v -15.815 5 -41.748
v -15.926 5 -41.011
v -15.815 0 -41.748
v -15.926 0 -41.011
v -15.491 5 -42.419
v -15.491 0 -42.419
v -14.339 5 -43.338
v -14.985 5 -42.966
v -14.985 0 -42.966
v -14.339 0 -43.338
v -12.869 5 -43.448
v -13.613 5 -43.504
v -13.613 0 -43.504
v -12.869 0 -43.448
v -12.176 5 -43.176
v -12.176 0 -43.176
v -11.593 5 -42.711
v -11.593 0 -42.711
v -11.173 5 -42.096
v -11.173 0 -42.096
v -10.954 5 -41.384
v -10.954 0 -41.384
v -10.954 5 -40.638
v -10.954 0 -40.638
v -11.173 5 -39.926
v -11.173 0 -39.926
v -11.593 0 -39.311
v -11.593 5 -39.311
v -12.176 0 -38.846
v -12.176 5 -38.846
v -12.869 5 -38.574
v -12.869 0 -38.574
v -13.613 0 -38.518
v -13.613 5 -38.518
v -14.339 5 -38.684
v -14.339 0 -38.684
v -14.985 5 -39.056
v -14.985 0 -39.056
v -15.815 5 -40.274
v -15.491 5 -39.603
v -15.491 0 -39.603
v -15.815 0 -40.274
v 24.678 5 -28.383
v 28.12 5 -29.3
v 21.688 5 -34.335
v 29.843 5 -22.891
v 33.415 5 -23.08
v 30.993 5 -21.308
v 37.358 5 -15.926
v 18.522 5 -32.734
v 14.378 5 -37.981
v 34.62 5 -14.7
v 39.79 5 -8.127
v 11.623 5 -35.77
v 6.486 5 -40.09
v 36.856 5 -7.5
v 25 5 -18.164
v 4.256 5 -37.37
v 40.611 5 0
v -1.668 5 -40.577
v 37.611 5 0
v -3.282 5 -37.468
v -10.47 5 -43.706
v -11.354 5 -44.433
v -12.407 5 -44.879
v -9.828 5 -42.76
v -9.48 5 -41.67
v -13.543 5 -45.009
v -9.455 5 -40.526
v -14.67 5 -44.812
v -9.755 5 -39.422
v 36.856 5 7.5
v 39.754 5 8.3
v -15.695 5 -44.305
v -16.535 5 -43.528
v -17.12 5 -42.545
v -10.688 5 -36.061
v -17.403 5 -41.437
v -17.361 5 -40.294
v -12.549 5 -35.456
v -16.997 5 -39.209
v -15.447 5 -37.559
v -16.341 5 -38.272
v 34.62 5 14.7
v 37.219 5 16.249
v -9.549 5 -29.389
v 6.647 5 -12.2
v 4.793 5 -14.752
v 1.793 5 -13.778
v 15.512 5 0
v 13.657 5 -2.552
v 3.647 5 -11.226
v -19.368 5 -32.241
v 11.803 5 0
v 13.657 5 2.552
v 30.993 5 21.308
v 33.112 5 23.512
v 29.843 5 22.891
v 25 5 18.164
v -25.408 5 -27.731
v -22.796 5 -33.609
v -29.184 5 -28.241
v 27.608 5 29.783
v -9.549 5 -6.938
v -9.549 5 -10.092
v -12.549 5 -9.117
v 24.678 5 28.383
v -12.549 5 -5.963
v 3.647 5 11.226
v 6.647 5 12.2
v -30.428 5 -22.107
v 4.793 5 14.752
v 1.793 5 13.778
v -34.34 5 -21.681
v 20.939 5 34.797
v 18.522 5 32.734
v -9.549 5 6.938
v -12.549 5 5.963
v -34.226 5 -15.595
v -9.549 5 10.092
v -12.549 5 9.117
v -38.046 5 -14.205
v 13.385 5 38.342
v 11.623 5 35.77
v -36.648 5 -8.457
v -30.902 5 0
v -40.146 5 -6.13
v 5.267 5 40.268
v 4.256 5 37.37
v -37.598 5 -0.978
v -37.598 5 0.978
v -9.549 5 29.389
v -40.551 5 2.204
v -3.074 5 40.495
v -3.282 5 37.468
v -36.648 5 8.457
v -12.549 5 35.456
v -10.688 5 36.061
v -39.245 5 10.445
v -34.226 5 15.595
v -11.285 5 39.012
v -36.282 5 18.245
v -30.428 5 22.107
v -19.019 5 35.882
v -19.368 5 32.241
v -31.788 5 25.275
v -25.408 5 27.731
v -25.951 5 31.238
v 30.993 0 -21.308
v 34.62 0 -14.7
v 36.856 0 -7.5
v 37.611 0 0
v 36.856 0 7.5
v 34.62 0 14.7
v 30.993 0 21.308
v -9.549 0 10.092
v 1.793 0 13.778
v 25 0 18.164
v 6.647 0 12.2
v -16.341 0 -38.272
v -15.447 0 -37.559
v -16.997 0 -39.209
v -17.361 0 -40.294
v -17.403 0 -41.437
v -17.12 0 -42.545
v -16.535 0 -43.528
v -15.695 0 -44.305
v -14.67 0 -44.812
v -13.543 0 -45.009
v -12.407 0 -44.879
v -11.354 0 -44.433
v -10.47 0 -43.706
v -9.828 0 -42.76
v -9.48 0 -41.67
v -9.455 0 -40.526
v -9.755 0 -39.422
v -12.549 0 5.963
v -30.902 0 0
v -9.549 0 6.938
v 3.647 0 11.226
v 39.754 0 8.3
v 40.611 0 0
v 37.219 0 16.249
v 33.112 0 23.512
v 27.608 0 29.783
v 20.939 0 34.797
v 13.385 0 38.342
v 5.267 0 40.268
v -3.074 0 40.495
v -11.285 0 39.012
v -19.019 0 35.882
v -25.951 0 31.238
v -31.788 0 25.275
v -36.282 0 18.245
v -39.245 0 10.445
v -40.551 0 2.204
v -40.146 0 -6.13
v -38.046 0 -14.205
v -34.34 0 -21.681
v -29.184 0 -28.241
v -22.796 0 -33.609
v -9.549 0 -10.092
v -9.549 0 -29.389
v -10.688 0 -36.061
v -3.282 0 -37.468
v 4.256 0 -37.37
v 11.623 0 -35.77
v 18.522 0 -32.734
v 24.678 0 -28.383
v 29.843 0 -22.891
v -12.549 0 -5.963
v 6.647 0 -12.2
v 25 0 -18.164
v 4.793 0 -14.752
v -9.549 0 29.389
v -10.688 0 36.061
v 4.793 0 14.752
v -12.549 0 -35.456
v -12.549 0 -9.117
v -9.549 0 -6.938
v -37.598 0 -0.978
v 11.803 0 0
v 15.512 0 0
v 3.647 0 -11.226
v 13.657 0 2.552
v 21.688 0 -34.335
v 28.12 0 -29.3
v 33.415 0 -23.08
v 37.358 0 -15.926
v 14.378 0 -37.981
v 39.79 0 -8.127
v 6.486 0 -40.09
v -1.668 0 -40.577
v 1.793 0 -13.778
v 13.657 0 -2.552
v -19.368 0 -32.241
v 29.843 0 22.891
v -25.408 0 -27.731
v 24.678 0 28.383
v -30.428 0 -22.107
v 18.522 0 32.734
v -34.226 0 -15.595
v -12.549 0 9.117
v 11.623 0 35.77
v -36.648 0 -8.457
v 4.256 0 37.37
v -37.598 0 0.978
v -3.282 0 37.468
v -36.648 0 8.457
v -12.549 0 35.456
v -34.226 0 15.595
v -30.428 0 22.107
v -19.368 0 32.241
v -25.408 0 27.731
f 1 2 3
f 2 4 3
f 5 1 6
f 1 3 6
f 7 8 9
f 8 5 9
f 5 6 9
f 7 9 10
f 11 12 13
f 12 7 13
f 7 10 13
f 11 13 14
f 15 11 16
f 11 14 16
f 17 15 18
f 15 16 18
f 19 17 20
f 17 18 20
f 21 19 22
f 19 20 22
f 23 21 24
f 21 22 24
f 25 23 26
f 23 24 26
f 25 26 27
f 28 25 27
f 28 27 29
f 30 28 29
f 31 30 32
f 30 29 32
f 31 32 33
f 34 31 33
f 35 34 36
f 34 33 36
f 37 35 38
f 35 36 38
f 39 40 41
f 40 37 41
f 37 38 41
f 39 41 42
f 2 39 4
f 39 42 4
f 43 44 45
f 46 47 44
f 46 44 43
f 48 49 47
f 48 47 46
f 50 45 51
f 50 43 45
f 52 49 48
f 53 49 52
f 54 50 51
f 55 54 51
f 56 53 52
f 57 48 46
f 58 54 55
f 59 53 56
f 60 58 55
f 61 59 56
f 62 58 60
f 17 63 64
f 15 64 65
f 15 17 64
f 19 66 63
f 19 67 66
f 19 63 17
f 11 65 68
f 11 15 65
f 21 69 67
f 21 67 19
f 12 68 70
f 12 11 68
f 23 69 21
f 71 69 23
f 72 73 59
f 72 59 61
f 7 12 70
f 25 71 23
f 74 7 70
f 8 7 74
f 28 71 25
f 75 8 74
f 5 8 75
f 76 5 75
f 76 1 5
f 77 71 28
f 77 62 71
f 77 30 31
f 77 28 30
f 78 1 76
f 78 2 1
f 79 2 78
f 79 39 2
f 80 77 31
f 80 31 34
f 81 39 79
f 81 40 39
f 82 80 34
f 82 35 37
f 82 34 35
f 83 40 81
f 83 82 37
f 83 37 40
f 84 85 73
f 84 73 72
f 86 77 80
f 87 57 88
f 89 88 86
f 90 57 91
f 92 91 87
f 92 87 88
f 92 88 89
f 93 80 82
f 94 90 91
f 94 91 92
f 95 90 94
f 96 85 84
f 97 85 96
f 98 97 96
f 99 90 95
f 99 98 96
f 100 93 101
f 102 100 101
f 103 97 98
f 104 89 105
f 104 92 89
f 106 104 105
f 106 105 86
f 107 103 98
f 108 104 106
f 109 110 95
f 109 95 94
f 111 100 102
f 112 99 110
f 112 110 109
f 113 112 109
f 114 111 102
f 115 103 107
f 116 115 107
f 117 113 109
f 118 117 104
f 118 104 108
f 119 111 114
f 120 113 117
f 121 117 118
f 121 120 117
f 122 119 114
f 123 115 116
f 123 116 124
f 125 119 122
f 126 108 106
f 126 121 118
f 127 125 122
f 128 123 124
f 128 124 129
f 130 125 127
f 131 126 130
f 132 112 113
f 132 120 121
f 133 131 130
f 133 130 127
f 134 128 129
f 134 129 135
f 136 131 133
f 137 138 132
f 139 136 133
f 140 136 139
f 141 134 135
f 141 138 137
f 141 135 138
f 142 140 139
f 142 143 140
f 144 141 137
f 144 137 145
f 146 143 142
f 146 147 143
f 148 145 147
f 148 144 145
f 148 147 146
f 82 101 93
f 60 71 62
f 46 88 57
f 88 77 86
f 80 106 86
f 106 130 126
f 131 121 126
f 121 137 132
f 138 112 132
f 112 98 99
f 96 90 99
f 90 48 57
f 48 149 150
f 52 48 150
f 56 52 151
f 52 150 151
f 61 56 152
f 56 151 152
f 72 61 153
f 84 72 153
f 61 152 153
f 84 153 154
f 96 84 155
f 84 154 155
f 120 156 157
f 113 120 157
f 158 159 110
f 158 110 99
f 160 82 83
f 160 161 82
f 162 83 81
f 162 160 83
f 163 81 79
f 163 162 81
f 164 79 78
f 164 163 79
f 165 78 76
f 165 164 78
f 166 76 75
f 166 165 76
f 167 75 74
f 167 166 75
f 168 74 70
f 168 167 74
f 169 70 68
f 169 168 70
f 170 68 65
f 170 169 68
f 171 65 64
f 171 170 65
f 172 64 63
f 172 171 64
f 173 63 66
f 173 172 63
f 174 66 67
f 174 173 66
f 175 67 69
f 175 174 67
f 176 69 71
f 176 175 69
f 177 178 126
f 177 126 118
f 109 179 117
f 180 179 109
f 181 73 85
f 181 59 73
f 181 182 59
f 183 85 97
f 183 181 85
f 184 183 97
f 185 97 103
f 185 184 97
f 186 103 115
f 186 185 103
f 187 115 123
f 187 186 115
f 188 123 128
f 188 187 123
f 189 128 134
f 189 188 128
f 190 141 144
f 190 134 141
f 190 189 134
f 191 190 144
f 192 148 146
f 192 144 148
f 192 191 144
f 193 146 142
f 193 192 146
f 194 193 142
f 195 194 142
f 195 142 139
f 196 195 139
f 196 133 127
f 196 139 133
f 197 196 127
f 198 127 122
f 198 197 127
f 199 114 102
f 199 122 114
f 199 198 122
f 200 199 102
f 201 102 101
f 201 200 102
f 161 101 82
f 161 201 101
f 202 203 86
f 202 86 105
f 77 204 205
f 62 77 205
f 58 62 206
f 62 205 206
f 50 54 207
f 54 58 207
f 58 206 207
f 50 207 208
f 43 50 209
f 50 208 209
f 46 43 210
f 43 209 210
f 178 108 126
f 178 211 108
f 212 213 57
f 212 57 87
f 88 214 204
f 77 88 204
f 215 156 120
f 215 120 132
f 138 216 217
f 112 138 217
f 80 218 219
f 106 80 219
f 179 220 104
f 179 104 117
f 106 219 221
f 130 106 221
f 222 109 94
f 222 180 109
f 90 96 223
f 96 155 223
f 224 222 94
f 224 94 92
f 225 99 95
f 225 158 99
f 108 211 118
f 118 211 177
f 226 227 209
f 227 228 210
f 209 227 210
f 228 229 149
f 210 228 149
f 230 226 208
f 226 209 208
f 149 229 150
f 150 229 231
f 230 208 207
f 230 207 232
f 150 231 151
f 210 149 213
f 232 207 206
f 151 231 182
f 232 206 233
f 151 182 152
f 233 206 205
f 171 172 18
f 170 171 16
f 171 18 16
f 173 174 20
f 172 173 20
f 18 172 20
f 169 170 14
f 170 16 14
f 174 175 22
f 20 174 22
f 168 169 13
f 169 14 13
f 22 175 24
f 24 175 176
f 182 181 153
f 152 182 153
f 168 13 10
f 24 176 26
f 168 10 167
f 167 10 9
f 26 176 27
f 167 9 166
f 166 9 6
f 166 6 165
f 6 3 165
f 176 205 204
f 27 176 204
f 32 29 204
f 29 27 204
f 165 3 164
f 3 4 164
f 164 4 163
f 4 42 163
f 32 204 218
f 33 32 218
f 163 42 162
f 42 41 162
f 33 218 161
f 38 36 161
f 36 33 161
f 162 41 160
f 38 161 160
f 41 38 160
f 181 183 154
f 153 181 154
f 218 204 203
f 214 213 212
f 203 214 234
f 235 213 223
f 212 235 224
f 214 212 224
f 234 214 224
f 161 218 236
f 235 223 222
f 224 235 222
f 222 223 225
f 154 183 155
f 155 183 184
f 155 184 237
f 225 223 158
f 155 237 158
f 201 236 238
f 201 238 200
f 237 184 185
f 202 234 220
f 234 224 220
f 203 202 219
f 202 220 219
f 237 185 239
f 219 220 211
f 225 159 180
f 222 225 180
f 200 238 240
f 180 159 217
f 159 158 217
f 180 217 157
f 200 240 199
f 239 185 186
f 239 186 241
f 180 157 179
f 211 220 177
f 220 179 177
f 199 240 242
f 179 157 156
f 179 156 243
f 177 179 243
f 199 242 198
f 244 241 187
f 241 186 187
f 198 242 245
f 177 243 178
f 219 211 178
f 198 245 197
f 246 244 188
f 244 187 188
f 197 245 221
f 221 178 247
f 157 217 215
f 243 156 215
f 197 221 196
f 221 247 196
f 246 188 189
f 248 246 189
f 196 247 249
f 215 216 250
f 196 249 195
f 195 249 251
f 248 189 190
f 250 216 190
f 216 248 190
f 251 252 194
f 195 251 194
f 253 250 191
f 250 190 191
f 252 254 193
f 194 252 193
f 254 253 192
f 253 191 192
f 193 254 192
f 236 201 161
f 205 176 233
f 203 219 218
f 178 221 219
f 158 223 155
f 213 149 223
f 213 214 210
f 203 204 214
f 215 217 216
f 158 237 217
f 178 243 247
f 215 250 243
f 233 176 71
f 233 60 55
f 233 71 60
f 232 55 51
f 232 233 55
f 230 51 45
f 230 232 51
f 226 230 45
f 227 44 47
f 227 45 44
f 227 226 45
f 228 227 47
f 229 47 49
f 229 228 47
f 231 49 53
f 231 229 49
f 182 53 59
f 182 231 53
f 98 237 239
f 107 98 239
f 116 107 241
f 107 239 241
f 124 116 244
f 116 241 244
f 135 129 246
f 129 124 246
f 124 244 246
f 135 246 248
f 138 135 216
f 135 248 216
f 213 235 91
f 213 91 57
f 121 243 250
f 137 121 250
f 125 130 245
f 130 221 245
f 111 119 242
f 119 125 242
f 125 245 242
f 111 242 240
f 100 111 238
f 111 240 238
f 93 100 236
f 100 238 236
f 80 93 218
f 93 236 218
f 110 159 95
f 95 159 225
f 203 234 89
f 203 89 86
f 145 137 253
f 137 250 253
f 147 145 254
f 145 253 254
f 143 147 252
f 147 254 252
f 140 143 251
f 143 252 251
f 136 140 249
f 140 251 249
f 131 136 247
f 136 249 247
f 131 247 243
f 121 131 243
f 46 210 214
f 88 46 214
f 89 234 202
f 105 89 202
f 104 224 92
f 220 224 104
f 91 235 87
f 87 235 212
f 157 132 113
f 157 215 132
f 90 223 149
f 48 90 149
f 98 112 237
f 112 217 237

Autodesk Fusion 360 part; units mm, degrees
sketch "草图2" plane through (0, 0, 0) normal (0, 1, 0) x (1, 0, 0)
  line L0 (-9.5492, 29.3893) -> (-9.5492, -29.3893)
  line L1 (-9.5492, -29.3893) -> (25, 18.1636)
  line L2 (25, 18.1636) -> (-30.9017, 0)
  line L3 (-30.9017, 0) -> (25, -18.1636)
  line L4 (25, -18.1636) -> (-9.5492, 29.3893)
  line L5 (-37.5985, -0.9785) -> (29.8427, -22.8914)
  line L6 (30.993, -21.3083) -> (-10.688, 36.0607)
  line L7 (-10.688, -36.0607) -> (30.993, 21.3083)
  line L8 (29.8427, 22.8914) -> (-37.5985, 0.9785)
  line L9 (-12.5492, 35.456) -> (-12.5492, -35.456)
  circle A0 centre (0, 0) radius 40.6112
  circle A1 centre (0, 0) radius 37.6112
  dimension "d2" = 3
extrude "拉伸1" add sketch "草图2" along normal blind 5 contours L0 L4 L6 L8 L9 A1 | L0 L2 L4 L8 | L0 L2 L8 L9 | L2 L4 L6 L8 | L0 L2 L3 L9 | L2 L3 L5 L8 L9 A1 | L1 L2 L4 L6 | L1 L2 L6 L7 L8 A1 | L0 L1 L3 L5 | L0 L3 L5 L9 | L1 L3 L4 L7 | L1 L4 L6 L7 | L0 L1 L5 L7 L9 A1 | L1 L3 L5 L7 | L3 L4 L5 L6 L7 A1 | A0 makes body 1
sketch "草图3" plane through (0, 5, 0) normal (0, 1, 0) x (-1, 0, 0)
  arc A0 (10.688, 36.0607) -> (-29.8427, 22.8914) centre (0, 0) ccw
  line L0 (10.688, 36.0607) -> (-4.7933, 14.7524)
  line L1 (-4.7933, 14.7524) -> (-29.8427, 22.8914)
  line L2 (9.5492, -29.3893) -> (-1.7933, -13.7777)
  line L3 (-1.7933, -13.7777) -> (9.5492, -10.0923)
  line L4 (9.5492, -10.0923) -> (9.5492, -29.3893)
  arc A1 (12.5492, -35.456) -> (37.5985, -0.9785) centre (0, 0) ccw
  line L5 (12.5492, -35.456) -> (12.5492, -9.1175)
  line L6 (12.5492, -9.1175) -> (37.5985, -0.9785)
  line L7 (9.5492, 29.3893) -> (9.5492, 10.0923)
  line L8 (9.5492, 10.0923) -> (-1.7933, 13.7777)
  line L9 (-1.7933, 13.7777) -> (9.5492, 29.3893)
  line L10 (-25, 18.1636) -> (-6.6475, 12.2005)
  line L11 (-6.6475, 12.2005) -> (-13.6575, 2.552)
  line L12 (-13.6575, 2.552) -> (-25, 18.1636)
  line L13 (30.9017, 0) -> (12.5492, -5.9631)
  line L14 (12.5492, -5.9631) -> (12.5492, 5.9631)
  line L15 (12.5492, 5.9631) -> (30.9017, 0)
  arc A2 (37.5985, 0.9785) -> (12.5492, 35.456) centre (0, 0) ccw
  line L16 (37.5985, 0.9785) -> (12.5492, 9.1175)
  line L17 (12.5492, 9.1175) -> (12.5492, 35.456)
  line L18 (-25, -18.1636) -> (-13.6575, -2.552)
  line L19 (-13.6575, -2.552) -> (-6.6475, -12.2005)
  line L20 (-6.6475, -12.2005) -> (-25, -18.1636)
  line L21 (-30.993, 21.3083) -> (-15.5116, 0)
  line L22 (-15.5116, 0) -> (-30.993, -21.3083)
  arc A3 (-30.993, 21.3083) -> (-30.993, -21.3083) centre (0, 0) ccw
  arc A4 (-29.8427, -22.8914) -> (10.688, -36.0607) centre (0, 0) ccw
  line L23 (-29.8427, -22.8914) -> (-4.7933, -14.7524)
  line L24 (-4.7933, -14.7524) -> (10.688, -36.0607)
  line L25 (-11.8034, 0) -> (-3.6475, 11.2257)
  line L26 (-3.6475, 11.2257) -> (9.5492, 6.9379)
  line L27 (9.5492, 6.9379) -> (9.5492, -6.9379)
  line L28 (9.5492, -6.9379) -> (-3.6475, -11.2257)
  line L29 (-3.6475, -11.2257) -> (-11.8034, 0)
  circle A5 centre (0, 0) radius 40.6112
  circle A6 centre (-70, 30) radius 2.5
  circle A7 centre (-70, 30) radius 4
extrude "拉伸2" add sketch "草图3" along normal blind 5 separate body contours A7 makes body 2
move_body "移动1" bodies 2 to x (1, 0, 0) y (0, 1, 0) z (0, 0, 1) at (-85, 0, -75)
move_body "移动2" bodies 2 to x (1, 0, 0) y (0, 1, 0) z (0, 0, 1) at (0, -5, 0)
move_body "移动3" bodies 2 to x (1, 0, 0) y (0, 1, 0) z (0, 0, 1) at (1.5742, 0, 3.989)
combine "合并1" operation add target body 1 tool bodies 2
